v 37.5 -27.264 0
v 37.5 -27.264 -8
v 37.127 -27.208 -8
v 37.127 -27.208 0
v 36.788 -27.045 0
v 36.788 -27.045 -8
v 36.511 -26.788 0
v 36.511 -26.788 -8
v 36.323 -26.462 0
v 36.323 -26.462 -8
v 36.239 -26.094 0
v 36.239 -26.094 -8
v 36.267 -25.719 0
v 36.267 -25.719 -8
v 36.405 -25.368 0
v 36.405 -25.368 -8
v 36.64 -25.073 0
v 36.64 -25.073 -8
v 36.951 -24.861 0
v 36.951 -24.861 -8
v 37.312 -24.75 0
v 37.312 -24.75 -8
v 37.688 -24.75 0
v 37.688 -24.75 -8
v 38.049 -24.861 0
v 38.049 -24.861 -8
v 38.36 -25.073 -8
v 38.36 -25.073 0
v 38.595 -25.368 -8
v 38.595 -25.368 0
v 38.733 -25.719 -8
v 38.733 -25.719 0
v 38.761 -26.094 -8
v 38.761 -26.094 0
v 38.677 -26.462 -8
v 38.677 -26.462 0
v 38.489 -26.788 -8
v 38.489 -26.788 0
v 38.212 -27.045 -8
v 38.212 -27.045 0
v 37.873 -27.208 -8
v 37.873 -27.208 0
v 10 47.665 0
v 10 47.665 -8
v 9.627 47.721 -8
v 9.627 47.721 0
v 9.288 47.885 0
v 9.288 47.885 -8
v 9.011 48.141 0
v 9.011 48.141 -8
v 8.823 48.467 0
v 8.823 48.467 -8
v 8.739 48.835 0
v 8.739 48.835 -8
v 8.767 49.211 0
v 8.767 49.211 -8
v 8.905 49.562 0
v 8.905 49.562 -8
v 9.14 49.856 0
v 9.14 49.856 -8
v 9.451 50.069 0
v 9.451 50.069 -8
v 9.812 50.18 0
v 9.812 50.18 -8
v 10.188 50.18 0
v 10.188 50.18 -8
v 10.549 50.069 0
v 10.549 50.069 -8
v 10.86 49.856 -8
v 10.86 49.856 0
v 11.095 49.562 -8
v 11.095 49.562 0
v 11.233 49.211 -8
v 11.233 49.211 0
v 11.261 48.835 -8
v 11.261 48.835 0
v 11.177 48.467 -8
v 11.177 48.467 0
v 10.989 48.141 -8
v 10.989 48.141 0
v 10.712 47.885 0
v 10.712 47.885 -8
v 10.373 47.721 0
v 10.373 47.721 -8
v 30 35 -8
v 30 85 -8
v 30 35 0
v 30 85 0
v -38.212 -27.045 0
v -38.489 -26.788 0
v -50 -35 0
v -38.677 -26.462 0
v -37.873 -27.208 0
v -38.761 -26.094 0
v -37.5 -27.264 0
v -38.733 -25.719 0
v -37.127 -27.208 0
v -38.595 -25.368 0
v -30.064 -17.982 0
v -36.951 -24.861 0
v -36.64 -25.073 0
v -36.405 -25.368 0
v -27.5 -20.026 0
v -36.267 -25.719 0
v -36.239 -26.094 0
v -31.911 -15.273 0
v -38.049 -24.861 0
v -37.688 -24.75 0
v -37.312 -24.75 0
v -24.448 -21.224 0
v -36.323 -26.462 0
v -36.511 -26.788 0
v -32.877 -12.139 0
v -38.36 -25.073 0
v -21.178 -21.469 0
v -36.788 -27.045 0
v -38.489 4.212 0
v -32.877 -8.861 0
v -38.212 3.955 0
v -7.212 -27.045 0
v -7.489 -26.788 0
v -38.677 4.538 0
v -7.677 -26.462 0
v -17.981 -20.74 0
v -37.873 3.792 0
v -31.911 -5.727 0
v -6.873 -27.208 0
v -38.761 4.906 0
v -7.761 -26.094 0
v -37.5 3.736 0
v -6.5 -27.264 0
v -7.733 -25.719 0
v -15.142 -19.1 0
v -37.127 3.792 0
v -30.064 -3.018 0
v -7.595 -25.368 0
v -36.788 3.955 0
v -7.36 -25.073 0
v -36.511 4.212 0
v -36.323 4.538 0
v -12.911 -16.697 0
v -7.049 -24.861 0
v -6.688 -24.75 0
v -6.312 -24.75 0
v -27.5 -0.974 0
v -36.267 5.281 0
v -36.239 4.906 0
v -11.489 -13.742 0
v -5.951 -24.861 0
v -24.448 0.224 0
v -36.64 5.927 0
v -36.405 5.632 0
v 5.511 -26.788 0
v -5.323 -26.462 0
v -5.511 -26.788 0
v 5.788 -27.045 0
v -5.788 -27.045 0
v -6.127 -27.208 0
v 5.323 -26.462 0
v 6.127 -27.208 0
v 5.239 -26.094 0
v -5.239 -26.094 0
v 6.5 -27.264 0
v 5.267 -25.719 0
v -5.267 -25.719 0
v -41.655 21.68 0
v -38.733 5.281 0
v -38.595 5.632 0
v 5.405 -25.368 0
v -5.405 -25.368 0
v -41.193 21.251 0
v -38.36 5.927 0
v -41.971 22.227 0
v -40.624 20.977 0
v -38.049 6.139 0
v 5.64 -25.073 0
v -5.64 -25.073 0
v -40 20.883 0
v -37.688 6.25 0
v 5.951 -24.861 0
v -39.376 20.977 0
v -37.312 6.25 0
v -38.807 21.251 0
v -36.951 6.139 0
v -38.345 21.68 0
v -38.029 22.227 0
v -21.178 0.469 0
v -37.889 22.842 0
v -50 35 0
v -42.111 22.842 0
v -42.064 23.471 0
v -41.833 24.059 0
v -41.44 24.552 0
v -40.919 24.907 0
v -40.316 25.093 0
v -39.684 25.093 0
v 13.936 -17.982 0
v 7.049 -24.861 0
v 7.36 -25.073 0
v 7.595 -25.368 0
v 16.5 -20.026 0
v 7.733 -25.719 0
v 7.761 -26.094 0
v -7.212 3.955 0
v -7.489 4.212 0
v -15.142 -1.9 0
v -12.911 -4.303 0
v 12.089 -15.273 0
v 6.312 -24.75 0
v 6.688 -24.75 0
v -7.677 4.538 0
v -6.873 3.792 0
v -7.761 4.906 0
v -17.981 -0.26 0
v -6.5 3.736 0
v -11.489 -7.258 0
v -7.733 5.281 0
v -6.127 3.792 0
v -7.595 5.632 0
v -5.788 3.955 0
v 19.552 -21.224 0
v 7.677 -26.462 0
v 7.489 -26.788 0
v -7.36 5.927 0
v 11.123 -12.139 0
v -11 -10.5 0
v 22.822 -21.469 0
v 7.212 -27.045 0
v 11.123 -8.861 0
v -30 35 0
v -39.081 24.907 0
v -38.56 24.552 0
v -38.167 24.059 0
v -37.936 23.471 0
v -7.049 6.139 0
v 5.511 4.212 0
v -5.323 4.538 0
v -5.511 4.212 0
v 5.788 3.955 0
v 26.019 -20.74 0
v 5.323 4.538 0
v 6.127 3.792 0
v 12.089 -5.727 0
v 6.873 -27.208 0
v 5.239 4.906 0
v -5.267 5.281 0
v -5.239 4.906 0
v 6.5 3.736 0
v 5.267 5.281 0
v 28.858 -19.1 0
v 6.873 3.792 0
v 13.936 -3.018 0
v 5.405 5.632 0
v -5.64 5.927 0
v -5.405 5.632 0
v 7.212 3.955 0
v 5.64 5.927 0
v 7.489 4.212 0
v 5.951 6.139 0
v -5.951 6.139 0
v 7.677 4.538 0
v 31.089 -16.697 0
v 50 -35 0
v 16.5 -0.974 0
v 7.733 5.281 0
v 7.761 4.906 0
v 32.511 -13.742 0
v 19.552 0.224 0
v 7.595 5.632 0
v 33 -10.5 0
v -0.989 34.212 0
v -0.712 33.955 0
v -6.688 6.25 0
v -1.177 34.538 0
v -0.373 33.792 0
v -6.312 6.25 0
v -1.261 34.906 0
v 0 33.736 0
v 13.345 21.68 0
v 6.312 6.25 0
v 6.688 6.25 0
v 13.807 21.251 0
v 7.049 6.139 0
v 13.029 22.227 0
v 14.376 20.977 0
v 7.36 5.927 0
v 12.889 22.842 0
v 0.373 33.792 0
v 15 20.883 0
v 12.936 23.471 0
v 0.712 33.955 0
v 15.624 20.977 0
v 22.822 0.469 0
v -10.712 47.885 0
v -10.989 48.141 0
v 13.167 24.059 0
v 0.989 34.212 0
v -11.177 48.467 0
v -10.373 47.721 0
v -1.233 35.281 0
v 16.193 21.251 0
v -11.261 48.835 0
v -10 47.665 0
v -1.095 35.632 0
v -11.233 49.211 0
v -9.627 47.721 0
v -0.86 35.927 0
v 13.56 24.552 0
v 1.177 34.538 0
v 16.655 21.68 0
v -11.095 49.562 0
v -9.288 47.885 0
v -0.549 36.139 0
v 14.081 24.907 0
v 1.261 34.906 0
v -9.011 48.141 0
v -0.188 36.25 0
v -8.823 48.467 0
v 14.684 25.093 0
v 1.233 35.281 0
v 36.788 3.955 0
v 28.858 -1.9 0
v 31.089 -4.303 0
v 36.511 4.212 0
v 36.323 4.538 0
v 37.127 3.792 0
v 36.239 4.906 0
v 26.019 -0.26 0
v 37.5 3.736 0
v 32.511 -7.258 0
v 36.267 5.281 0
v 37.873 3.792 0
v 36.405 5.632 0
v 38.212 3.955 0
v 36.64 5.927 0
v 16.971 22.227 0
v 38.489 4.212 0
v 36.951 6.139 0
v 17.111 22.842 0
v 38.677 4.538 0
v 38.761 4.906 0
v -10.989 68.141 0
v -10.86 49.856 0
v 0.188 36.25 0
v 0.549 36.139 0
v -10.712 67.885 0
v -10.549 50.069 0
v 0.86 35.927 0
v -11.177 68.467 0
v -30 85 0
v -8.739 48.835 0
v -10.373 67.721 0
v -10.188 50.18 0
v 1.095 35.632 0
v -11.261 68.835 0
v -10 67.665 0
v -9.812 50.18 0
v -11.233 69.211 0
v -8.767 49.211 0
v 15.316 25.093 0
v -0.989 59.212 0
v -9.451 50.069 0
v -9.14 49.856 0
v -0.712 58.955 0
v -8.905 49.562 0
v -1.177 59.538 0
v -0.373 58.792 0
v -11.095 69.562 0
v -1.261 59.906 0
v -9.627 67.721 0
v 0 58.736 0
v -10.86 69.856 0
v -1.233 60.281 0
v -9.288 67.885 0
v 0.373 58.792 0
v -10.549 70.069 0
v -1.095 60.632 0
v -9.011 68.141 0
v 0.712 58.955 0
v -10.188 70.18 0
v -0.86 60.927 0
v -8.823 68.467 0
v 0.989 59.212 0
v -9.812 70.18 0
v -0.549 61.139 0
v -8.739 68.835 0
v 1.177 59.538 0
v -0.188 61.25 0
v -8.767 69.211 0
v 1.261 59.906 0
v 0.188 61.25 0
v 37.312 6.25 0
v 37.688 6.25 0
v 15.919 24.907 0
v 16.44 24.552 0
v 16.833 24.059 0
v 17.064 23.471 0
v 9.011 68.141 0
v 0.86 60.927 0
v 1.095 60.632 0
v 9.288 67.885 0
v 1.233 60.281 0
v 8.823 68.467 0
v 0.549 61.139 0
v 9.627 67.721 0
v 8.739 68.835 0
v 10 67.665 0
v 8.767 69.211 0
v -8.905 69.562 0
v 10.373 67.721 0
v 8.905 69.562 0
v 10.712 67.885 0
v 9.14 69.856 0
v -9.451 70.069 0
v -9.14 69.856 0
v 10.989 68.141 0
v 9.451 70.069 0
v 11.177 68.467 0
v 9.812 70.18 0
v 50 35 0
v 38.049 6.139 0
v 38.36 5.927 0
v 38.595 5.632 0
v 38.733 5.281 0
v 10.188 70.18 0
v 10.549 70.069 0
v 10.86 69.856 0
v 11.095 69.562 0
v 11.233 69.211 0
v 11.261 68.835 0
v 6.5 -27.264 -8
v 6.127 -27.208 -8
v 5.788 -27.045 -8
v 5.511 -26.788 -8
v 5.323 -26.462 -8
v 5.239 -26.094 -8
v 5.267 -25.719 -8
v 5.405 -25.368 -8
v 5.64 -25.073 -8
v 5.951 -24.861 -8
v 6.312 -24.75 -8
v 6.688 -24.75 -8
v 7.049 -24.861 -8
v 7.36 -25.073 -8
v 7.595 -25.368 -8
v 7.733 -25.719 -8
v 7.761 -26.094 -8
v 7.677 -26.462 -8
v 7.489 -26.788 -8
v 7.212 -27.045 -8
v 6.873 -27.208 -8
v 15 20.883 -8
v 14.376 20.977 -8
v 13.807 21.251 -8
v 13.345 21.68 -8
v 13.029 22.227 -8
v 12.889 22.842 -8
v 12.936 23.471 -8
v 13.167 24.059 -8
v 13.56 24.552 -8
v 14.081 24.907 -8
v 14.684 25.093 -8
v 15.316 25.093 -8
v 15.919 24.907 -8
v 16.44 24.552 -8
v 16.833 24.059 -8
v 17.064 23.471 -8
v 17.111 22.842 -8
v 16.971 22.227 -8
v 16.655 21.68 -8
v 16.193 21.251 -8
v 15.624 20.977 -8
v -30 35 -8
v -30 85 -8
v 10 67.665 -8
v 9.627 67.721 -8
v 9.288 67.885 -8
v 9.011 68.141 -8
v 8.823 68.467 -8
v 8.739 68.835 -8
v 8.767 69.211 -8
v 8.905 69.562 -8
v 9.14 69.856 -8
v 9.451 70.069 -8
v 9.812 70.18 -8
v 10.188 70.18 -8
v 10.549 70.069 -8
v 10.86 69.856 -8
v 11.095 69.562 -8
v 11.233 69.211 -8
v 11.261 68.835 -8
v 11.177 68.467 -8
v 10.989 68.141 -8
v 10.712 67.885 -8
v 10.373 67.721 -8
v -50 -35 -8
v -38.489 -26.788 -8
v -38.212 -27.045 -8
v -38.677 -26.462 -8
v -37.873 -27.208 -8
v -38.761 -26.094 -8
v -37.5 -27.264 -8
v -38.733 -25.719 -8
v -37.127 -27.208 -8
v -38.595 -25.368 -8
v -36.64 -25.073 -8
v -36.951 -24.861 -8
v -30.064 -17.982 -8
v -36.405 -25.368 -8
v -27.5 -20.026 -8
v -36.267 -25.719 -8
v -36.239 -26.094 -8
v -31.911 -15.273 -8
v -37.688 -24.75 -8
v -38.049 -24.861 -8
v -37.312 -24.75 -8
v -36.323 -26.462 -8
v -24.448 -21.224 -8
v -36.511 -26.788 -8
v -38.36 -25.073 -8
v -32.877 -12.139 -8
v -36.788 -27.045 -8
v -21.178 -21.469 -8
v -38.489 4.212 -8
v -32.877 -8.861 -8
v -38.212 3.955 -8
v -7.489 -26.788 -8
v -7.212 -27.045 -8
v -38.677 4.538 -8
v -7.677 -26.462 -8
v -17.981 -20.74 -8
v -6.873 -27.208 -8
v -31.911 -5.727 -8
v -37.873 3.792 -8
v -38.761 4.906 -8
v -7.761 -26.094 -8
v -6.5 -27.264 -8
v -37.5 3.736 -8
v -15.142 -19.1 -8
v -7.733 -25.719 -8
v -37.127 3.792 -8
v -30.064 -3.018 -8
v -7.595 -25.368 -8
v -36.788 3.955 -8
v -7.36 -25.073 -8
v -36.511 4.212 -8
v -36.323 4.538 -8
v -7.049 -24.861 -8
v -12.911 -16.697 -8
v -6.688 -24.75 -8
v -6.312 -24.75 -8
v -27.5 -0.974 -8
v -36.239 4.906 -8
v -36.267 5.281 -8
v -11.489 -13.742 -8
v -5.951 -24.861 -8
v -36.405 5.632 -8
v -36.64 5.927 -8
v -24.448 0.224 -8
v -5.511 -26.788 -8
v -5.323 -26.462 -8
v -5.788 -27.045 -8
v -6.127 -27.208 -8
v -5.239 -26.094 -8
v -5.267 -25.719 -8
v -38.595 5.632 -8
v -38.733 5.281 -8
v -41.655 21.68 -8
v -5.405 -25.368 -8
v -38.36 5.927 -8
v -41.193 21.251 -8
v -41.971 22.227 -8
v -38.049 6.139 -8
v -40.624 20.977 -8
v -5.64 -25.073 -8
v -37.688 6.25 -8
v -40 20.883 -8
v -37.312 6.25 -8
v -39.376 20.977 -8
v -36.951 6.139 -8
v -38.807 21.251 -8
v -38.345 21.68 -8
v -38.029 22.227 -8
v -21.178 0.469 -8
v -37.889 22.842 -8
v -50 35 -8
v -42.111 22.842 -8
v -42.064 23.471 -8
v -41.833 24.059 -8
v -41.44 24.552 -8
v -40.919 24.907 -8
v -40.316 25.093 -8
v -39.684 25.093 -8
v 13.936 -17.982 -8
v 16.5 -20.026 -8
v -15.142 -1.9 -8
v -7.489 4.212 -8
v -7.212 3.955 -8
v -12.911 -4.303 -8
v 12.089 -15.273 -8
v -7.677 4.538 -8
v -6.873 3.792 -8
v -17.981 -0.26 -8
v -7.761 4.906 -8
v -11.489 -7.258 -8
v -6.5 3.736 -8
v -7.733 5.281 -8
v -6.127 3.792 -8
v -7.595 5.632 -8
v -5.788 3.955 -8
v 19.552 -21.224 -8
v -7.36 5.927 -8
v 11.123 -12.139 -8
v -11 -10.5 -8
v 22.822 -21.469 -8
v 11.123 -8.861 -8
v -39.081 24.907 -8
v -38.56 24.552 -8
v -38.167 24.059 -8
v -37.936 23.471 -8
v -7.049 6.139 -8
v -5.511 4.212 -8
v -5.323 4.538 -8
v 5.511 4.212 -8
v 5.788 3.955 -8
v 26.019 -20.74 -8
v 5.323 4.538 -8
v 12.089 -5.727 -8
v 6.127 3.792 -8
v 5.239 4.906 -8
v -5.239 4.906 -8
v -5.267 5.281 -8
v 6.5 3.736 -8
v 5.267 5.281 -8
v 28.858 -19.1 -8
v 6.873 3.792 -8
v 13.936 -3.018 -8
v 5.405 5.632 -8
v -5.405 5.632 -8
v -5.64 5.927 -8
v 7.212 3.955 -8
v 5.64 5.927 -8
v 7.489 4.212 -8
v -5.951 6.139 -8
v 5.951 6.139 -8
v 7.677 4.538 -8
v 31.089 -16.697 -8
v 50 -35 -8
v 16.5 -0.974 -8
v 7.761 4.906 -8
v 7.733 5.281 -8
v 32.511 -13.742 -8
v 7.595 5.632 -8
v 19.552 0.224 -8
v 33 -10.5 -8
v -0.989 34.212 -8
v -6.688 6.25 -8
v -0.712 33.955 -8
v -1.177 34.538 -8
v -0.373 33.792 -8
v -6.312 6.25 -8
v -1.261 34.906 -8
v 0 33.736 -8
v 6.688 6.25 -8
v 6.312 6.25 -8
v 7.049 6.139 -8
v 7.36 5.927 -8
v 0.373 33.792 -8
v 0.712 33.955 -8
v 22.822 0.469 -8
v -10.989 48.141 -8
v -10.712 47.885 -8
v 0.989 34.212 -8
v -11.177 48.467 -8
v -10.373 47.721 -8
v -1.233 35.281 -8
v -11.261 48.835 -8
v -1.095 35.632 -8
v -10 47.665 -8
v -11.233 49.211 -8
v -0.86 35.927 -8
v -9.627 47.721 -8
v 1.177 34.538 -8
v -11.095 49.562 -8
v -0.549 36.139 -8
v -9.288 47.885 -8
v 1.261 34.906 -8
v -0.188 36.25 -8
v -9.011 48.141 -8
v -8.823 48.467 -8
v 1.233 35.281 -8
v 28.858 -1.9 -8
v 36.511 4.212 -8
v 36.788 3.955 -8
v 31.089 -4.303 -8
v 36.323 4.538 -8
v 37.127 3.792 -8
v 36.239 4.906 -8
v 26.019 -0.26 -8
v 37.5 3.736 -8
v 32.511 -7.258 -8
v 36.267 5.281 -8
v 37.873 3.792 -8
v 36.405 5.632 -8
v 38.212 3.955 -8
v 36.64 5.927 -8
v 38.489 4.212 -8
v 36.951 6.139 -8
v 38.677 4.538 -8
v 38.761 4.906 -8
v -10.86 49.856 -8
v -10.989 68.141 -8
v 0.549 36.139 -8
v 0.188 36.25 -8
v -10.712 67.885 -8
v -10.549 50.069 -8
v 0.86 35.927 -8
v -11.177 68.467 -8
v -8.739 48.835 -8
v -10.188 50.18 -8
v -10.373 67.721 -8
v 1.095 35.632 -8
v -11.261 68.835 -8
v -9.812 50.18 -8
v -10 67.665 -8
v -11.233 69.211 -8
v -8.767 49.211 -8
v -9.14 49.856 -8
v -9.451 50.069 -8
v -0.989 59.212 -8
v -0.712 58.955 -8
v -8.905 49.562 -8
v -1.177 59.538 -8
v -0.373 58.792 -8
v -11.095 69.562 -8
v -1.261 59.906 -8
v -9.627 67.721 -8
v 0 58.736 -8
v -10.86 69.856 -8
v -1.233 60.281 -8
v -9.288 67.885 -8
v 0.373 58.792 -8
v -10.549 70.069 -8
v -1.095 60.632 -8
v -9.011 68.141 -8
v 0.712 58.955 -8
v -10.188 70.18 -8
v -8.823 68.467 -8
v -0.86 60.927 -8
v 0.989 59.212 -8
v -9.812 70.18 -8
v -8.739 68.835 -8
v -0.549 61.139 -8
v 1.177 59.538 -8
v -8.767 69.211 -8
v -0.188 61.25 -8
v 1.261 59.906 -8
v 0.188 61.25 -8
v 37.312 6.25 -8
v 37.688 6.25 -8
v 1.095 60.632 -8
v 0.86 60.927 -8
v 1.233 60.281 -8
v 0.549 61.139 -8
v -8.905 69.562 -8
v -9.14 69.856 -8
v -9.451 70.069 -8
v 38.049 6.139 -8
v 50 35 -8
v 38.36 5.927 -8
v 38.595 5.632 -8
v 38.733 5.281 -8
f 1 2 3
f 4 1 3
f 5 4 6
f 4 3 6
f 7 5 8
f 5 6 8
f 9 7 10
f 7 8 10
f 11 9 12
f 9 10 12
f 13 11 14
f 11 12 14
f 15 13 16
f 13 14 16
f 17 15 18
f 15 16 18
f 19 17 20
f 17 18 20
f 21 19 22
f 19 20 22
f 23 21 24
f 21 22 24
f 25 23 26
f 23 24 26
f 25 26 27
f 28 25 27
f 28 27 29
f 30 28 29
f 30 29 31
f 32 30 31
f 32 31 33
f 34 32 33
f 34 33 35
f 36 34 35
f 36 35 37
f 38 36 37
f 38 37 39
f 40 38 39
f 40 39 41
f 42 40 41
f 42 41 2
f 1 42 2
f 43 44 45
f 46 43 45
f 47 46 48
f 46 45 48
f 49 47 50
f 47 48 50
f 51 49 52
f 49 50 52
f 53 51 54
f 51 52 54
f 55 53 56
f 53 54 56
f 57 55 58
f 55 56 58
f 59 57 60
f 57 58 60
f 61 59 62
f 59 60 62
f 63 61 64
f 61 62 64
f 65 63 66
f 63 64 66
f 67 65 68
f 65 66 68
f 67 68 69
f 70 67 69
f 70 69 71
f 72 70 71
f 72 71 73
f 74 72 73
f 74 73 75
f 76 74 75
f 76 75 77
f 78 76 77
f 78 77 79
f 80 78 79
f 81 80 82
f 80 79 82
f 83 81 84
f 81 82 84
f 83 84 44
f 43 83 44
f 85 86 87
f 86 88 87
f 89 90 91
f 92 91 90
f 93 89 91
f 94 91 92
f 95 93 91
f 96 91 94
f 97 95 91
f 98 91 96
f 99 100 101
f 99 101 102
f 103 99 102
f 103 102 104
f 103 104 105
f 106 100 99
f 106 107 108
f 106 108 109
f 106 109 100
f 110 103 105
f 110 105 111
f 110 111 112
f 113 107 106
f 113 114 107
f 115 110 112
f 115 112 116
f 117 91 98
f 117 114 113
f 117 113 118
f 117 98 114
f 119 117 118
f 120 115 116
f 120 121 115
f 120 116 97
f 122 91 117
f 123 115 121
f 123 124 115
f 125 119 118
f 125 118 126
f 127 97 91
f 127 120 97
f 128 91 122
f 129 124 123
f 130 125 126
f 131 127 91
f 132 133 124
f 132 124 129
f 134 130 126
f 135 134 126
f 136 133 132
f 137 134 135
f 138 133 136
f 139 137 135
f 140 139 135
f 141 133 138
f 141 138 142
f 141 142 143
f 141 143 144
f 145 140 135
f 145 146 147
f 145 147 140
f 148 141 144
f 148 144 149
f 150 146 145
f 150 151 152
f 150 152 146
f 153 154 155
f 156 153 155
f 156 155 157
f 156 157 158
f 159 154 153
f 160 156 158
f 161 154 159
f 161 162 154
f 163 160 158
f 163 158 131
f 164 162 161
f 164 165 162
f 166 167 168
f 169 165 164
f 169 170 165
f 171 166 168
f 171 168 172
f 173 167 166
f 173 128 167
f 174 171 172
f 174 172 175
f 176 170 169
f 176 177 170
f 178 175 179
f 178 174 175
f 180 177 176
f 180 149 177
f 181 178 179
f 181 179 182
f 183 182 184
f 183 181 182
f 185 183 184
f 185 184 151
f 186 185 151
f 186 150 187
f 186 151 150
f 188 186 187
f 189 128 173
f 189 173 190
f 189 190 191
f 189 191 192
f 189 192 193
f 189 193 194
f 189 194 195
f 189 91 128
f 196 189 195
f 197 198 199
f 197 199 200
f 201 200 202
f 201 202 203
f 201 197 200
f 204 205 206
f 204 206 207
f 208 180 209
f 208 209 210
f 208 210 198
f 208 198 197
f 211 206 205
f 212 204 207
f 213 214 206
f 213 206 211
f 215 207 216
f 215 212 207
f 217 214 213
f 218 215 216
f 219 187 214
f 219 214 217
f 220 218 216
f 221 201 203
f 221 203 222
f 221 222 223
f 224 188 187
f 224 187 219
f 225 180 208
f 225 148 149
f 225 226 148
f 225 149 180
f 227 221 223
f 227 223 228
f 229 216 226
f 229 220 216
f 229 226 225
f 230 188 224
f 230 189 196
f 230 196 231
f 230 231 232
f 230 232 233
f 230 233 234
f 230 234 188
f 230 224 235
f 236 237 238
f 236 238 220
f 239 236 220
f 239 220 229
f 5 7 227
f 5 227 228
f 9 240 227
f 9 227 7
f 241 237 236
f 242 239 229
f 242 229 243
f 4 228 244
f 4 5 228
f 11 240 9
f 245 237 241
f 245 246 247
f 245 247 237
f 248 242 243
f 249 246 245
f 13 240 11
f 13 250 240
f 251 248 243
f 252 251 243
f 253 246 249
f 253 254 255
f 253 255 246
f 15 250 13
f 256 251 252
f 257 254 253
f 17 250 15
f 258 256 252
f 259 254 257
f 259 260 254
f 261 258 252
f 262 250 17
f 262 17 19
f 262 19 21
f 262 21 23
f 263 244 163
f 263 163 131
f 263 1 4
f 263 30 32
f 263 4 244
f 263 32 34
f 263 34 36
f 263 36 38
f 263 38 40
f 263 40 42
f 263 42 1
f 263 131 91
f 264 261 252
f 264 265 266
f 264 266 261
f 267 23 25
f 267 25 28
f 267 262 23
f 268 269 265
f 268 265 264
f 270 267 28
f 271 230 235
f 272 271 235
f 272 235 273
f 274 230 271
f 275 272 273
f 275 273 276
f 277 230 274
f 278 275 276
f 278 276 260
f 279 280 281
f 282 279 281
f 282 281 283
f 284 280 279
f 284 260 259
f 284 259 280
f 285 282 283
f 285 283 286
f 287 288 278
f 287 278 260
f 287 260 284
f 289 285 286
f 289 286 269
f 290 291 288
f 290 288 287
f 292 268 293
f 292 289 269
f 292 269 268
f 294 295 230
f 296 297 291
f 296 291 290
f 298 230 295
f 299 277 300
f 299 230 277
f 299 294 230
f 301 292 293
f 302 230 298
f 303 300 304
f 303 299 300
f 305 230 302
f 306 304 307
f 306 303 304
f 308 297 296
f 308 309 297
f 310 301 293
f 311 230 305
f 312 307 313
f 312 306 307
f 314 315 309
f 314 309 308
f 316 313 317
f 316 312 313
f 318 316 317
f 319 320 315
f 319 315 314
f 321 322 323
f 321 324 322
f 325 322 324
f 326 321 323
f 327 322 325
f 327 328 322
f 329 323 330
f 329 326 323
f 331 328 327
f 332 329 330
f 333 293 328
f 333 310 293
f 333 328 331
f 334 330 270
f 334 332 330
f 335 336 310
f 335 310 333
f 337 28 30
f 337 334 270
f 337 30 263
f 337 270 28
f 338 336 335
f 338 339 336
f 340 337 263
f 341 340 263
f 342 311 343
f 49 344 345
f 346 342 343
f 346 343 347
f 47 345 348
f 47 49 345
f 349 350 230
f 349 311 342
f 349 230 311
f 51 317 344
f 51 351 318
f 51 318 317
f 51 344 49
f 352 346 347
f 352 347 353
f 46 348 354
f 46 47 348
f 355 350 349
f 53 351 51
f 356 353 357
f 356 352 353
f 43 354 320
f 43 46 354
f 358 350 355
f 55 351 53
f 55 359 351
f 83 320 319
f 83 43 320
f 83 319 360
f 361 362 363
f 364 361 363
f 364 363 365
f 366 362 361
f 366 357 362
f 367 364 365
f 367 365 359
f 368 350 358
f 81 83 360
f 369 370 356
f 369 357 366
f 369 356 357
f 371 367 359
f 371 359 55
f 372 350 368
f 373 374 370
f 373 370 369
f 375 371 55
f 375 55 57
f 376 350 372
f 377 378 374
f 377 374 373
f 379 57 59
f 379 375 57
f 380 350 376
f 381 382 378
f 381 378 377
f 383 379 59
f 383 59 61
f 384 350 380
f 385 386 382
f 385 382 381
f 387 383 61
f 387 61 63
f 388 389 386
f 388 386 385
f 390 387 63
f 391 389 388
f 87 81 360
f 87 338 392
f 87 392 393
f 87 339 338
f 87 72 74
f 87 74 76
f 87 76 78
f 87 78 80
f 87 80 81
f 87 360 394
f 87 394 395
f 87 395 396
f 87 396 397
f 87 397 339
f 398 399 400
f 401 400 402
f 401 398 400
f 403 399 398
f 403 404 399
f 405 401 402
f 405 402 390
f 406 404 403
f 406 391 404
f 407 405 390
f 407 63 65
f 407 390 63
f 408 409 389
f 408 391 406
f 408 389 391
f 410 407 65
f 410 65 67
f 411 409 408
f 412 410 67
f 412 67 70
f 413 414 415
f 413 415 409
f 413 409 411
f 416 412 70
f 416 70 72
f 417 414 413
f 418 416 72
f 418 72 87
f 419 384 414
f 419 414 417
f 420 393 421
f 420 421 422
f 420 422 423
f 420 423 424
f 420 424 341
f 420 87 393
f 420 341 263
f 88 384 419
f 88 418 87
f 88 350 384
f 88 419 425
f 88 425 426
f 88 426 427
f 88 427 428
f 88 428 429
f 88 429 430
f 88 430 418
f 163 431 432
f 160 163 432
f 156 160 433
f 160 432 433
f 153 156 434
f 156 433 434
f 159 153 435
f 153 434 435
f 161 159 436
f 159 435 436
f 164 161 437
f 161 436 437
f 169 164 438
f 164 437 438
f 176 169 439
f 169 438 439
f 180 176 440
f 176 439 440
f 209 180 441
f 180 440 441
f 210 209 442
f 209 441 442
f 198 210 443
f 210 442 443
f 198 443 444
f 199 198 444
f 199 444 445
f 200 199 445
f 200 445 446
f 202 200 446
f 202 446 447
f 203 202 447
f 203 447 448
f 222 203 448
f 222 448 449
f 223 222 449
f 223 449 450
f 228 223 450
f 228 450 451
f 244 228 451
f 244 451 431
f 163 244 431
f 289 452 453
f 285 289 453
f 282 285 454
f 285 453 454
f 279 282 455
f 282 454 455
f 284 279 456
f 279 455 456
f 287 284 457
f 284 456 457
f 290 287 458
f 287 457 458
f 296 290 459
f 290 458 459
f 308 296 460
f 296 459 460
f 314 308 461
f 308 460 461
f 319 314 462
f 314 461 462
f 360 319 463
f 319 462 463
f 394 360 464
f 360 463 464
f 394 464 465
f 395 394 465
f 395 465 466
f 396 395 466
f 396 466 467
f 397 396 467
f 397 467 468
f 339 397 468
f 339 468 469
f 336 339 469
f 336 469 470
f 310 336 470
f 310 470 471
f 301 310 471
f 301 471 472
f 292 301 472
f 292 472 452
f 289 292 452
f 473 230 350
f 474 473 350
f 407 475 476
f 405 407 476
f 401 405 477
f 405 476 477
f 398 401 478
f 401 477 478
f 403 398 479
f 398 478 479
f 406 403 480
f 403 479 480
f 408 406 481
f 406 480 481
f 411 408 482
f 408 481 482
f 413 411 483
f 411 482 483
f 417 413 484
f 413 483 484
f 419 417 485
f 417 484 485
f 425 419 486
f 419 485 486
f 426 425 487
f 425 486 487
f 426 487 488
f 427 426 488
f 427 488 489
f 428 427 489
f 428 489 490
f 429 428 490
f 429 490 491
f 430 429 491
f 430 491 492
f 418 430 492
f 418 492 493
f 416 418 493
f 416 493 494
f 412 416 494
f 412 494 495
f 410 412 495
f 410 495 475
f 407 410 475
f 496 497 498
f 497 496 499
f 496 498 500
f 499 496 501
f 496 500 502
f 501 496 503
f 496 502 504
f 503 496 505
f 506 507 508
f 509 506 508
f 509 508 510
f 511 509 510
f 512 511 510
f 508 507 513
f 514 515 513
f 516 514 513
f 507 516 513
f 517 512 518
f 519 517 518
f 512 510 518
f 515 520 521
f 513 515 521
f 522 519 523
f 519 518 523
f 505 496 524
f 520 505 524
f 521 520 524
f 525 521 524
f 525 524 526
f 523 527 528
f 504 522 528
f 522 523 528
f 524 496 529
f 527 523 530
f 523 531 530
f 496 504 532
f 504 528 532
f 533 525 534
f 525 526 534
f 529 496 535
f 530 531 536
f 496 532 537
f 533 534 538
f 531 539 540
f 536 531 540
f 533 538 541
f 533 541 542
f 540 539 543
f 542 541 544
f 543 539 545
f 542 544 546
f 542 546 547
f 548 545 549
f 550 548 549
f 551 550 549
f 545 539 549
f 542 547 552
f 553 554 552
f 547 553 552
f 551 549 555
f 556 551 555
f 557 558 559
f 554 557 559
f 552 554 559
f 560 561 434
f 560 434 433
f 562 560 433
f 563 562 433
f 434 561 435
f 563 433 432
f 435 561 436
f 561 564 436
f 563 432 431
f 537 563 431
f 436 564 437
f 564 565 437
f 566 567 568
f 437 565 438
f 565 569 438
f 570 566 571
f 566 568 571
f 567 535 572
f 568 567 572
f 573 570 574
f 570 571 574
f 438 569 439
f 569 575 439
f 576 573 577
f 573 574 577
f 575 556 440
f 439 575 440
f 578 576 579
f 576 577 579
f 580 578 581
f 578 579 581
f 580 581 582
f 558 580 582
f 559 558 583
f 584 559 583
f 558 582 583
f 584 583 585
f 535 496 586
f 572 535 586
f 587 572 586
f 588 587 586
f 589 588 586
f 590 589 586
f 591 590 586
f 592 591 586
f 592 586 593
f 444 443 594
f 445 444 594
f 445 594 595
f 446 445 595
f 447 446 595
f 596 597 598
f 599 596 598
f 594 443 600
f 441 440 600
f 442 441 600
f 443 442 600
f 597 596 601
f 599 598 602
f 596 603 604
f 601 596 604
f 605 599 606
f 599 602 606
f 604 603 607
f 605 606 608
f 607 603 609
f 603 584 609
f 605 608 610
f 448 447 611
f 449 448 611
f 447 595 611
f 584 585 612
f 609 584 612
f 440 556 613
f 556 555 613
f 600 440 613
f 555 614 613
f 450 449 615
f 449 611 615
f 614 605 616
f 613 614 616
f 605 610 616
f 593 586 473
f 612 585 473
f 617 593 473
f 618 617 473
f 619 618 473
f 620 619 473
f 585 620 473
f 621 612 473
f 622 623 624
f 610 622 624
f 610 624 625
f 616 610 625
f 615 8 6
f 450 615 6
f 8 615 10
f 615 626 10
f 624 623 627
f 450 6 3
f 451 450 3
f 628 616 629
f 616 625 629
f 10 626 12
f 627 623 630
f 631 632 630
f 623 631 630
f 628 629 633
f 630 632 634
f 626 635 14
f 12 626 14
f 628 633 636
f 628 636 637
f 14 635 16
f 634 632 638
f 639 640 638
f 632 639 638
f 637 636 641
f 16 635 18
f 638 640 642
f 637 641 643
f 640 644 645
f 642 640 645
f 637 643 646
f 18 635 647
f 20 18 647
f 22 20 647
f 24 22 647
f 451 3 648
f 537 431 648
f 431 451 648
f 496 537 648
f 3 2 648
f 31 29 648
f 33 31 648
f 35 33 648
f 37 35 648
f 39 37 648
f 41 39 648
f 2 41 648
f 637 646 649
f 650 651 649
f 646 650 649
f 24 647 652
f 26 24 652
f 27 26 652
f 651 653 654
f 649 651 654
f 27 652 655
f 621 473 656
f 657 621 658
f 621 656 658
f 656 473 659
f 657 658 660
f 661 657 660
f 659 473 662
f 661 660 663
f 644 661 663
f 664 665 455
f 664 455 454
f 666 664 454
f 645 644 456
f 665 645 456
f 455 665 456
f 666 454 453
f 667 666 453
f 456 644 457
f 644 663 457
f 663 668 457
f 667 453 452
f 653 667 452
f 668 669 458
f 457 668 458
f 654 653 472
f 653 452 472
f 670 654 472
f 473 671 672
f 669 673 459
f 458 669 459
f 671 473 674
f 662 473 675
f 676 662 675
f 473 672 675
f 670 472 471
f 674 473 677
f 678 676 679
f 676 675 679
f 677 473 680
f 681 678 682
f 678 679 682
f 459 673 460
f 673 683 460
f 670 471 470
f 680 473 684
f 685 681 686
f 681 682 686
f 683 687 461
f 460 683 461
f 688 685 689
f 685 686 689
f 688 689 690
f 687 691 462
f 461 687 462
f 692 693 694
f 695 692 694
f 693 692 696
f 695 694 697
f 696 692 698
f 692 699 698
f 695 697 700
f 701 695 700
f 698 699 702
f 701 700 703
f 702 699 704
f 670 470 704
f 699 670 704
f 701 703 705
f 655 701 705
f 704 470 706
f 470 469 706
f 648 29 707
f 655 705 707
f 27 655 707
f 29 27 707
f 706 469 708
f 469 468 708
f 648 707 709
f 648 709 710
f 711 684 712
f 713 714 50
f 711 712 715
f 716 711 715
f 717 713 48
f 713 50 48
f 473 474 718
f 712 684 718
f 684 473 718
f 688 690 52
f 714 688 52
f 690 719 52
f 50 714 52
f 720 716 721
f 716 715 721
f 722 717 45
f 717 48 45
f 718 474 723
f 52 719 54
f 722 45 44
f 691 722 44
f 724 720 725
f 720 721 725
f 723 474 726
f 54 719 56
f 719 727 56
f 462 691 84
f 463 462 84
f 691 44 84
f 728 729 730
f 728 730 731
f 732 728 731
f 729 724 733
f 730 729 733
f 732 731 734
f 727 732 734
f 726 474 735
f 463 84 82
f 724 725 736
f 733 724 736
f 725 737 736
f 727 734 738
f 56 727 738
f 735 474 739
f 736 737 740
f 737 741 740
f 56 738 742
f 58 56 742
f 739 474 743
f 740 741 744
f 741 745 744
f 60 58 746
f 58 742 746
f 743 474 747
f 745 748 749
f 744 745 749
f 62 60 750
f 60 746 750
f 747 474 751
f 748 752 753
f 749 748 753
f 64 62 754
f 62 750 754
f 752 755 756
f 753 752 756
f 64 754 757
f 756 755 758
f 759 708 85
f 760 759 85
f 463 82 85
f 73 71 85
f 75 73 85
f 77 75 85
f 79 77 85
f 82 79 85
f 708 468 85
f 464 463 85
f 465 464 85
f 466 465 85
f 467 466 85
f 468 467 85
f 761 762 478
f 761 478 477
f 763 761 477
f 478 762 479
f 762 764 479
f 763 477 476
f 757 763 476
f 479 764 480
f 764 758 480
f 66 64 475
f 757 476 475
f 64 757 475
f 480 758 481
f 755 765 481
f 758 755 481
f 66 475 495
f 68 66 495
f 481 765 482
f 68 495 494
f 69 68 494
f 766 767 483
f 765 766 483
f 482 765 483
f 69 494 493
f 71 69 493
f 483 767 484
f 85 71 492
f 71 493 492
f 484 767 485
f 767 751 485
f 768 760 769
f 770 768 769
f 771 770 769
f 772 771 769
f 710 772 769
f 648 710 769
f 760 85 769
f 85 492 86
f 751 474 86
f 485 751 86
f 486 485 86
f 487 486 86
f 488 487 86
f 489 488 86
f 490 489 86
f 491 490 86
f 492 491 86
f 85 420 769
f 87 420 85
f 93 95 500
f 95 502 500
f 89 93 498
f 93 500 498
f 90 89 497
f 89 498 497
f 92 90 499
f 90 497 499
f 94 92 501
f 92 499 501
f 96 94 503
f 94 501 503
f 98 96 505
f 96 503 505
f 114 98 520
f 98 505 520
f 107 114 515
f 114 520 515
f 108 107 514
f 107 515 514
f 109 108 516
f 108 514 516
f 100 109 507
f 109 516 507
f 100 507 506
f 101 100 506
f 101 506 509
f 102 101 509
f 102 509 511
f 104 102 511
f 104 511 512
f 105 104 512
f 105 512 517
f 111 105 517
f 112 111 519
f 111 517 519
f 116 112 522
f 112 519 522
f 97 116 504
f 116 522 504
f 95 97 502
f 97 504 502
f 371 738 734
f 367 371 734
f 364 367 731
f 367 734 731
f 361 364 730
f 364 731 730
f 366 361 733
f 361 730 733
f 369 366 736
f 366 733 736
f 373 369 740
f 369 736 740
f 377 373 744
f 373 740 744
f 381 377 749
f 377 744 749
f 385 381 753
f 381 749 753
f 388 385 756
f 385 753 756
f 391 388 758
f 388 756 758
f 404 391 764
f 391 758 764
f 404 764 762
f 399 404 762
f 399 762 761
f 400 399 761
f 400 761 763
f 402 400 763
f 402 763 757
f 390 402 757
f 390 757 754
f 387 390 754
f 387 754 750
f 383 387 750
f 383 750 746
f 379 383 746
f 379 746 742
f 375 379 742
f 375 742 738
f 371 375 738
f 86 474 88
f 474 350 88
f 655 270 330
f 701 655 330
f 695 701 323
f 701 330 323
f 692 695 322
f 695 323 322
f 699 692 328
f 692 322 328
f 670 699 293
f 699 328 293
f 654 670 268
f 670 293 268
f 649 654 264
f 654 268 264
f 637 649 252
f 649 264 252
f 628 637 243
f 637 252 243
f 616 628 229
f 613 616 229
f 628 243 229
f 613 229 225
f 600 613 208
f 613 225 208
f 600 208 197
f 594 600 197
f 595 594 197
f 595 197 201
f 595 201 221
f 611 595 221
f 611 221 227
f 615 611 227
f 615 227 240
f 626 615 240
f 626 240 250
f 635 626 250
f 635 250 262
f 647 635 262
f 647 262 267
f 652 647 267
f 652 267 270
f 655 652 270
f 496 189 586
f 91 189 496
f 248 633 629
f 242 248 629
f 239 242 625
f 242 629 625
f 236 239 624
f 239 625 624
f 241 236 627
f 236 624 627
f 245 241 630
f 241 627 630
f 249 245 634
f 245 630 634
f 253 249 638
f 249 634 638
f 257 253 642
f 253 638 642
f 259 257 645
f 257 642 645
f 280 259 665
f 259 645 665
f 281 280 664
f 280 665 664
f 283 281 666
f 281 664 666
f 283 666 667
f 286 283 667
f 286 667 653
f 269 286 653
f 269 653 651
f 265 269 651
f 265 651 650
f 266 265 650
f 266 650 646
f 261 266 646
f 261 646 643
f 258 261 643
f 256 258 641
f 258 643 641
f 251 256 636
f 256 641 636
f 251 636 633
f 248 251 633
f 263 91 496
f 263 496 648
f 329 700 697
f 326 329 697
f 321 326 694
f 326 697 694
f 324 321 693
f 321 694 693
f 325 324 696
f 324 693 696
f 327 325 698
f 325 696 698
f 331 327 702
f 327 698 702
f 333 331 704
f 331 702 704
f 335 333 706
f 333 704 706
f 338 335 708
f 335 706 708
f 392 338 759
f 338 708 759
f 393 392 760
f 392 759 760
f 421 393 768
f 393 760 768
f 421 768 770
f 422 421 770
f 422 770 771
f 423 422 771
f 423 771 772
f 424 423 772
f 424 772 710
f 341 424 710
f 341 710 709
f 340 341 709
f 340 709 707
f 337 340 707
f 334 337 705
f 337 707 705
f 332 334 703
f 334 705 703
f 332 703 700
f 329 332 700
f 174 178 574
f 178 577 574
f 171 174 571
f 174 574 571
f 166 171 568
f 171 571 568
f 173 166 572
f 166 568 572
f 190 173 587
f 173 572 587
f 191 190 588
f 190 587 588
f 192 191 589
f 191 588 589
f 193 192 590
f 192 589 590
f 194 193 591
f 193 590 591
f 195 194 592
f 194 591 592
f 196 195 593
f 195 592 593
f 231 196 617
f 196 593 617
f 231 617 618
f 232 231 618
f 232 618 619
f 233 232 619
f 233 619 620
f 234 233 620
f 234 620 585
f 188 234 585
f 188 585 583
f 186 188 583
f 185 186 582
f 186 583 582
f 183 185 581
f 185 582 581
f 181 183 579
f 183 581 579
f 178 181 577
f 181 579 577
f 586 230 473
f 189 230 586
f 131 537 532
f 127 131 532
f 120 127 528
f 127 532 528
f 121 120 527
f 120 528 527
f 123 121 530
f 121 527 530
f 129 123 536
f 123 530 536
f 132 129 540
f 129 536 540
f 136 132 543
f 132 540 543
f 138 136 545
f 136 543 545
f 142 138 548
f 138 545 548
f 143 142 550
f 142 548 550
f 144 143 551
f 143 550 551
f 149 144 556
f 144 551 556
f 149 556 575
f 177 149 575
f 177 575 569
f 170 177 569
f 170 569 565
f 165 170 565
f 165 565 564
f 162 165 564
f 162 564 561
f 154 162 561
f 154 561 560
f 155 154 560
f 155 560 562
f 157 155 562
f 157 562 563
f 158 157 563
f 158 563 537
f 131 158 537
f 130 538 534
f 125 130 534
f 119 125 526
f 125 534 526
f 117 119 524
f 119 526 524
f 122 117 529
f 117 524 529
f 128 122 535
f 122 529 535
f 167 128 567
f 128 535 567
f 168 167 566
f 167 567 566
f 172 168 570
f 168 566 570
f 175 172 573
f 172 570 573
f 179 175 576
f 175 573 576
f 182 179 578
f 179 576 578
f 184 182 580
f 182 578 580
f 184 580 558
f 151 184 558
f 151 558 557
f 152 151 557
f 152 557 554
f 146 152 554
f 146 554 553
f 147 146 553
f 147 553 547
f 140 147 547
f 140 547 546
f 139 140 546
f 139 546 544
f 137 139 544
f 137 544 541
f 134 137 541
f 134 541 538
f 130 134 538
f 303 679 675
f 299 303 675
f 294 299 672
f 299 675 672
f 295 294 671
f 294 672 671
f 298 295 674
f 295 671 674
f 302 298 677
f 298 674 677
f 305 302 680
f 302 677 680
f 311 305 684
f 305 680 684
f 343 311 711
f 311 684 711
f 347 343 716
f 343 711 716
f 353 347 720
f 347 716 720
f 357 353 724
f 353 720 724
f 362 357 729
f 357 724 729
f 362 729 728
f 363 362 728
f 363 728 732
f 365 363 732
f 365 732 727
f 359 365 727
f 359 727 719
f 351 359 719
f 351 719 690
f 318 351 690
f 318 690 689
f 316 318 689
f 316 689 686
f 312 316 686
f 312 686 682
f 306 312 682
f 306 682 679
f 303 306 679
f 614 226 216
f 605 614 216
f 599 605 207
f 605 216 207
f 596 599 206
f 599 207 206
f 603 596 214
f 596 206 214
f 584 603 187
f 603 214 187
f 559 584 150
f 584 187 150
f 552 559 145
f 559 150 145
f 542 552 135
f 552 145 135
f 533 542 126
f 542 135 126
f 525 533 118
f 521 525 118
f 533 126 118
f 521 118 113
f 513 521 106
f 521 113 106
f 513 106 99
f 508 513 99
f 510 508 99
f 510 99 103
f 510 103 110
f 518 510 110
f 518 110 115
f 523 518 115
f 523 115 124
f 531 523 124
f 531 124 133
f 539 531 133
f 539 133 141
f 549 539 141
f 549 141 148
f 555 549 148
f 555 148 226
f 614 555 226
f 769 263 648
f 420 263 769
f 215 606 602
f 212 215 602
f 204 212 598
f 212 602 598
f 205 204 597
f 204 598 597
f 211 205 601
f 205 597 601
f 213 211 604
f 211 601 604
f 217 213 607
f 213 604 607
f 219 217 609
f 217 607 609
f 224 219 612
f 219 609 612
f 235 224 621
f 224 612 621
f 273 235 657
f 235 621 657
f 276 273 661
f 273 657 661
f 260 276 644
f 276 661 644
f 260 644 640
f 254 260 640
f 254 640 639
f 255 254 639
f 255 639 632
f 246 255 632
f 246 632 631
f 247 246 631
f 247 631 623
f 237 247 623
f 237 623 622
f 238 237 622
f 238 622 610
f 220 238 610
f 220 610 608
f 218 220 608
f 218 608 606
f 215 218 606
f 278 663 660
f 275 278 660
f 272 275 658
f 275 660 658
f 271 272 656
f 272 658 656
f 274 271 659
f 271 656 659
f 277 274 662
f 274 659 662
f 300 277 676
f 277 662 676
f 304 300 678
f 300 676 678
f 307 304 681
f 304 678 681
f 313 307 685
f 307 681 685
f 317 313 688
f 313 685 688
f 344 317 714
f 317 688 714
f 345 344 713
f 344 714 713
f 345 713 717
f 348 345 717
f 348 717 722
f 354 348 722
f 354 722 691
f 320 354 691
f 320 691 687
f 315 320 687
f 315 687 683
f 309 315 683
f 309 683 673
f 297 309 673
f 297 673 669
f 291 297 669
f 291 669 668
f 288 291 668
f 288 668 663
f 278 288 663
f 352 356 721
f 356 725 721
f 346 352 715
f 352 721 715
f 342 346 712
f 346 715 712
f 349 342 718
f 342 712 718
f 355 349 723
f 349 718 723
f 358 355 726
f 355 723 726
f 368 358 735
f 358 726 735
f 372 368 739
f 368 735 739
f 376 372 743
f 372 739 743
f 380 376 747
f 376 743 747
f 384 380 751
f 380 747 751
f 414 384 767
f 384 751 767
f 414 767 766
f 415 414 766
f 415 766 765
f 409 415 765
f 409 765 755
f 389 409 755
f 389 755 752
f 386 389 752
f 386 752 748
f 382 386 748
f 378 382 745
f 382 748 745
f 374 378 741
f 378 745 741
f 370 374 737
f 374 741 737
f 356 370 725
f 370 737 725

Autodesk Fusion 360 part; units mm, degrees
sketch "Sketch1" plane through (0, 0, 0) normal (0, 0, 1) x (1, 0, 0)
  line L0 (50, 35) -> (-50, 35)
  line L1 (-50, 35) -> (-50, -35)
  line L2 (-50, -35) -> (50, -35)
  line L3 (50, -35) -> (50, 35)
  line L4 (50, 35) -> (-50, -35) construction
  line L5 (-50, 35) -> (50, -35) construction
  line L6 (-30, 35) -> (-30, 85)
  line L7 (-30, 85) -> (30, 85)
  line L8 (30, 85) -> (30, 35)
  circle A0 centre (-22, -10.5) radius 11
  circle A1 centre (22, -10.5) radius 11
  point P0 (-37.5, -26)
  point P1 (-6.5, -26)
  point P2 (-37.5, 5)
  point P3 (-6.5, 5)
  point P4 (6.5, -26)
  point P5 (37.5, -26)
  point P6 (6.5, 5)
  point P7 (37.5, 5)
  point P8 (-40, 23)
  point P9 (15, 23)
  point P10 (10, 48.9294)
  point P11 (10, 68.9294)
  point P12 (-10, 68.9294)
  point P13 (-10, 48.9294)
  point P14 (0, 35)
  point P15 (0, 60)
  dimension "d1" = 100
  dimension "d2" = 70
  dimension "d3" = 9
  dimension "d6" = 31
  dimension "d7" = 31
  dimension "d8" = 12.5
  dimension "d10" = 31
  dimension "d13" = 12.5
  dimension "d15" = 12
  dimension "d16" = 10
  dimension "d17" = 55
  dimension "d18" = 50
  dimension "d19" = 60
  dimension "d20" = 20
  dimension "d21" = 20
  dimension "d22" = 20
  dimension "d23" = 20
  dimension "d37" = 22
  dimension "d38" = 15.5
  dimension "d39" = 15.5
  dimension "d40" = 22
  dimension "d41" = 15.5
  dimension "d42" = 21.9203
  dimension "d45" = 25
extrude "Extrude1" add sketch "Sketch1" against normal blind 8 contours L0 L1 L2 L3 | L0 L6 L7 L8 | A0 | A1
hole "Hole1" at (-37.5, 5, 0) at (-37.5, -26, 0) at (-6.5, -26, 0) at (6.5, -26, 0) at (-6.5, 5, 0) at (6.5, 5, 0) at (37.5, 5, 0) at (37.5, -26, 0) at (-10, 48.9294, 0) at (-10, 68.9294, 0) at (0, 60, 0) at (10, 68.9294, 0) at (0, 35, 0) at (10, 48.9294, 0) direction (0, 0, -1) diameter 2.529 depth 40 tip angle 118
hole "Hole2" at (15, 23, 0) at (-40, 23, 0) direction (0, 0, -1) diameter 4.234 depth 20 tip angle 118
extrude "Extrude2" cut sketch "Sketch1" against normal blind 20 contours A0 | A1
equation "d38 = ( 31 / 2 ) * 1 mm"
equation "d39 = ( 31 / 2 ) * 1 mm"
equation "d41 = ( 31 / 2 ) * 1 mm"
equation "d42 = ( 31 / 2 * sqrt(2) ) * 1 mm"
